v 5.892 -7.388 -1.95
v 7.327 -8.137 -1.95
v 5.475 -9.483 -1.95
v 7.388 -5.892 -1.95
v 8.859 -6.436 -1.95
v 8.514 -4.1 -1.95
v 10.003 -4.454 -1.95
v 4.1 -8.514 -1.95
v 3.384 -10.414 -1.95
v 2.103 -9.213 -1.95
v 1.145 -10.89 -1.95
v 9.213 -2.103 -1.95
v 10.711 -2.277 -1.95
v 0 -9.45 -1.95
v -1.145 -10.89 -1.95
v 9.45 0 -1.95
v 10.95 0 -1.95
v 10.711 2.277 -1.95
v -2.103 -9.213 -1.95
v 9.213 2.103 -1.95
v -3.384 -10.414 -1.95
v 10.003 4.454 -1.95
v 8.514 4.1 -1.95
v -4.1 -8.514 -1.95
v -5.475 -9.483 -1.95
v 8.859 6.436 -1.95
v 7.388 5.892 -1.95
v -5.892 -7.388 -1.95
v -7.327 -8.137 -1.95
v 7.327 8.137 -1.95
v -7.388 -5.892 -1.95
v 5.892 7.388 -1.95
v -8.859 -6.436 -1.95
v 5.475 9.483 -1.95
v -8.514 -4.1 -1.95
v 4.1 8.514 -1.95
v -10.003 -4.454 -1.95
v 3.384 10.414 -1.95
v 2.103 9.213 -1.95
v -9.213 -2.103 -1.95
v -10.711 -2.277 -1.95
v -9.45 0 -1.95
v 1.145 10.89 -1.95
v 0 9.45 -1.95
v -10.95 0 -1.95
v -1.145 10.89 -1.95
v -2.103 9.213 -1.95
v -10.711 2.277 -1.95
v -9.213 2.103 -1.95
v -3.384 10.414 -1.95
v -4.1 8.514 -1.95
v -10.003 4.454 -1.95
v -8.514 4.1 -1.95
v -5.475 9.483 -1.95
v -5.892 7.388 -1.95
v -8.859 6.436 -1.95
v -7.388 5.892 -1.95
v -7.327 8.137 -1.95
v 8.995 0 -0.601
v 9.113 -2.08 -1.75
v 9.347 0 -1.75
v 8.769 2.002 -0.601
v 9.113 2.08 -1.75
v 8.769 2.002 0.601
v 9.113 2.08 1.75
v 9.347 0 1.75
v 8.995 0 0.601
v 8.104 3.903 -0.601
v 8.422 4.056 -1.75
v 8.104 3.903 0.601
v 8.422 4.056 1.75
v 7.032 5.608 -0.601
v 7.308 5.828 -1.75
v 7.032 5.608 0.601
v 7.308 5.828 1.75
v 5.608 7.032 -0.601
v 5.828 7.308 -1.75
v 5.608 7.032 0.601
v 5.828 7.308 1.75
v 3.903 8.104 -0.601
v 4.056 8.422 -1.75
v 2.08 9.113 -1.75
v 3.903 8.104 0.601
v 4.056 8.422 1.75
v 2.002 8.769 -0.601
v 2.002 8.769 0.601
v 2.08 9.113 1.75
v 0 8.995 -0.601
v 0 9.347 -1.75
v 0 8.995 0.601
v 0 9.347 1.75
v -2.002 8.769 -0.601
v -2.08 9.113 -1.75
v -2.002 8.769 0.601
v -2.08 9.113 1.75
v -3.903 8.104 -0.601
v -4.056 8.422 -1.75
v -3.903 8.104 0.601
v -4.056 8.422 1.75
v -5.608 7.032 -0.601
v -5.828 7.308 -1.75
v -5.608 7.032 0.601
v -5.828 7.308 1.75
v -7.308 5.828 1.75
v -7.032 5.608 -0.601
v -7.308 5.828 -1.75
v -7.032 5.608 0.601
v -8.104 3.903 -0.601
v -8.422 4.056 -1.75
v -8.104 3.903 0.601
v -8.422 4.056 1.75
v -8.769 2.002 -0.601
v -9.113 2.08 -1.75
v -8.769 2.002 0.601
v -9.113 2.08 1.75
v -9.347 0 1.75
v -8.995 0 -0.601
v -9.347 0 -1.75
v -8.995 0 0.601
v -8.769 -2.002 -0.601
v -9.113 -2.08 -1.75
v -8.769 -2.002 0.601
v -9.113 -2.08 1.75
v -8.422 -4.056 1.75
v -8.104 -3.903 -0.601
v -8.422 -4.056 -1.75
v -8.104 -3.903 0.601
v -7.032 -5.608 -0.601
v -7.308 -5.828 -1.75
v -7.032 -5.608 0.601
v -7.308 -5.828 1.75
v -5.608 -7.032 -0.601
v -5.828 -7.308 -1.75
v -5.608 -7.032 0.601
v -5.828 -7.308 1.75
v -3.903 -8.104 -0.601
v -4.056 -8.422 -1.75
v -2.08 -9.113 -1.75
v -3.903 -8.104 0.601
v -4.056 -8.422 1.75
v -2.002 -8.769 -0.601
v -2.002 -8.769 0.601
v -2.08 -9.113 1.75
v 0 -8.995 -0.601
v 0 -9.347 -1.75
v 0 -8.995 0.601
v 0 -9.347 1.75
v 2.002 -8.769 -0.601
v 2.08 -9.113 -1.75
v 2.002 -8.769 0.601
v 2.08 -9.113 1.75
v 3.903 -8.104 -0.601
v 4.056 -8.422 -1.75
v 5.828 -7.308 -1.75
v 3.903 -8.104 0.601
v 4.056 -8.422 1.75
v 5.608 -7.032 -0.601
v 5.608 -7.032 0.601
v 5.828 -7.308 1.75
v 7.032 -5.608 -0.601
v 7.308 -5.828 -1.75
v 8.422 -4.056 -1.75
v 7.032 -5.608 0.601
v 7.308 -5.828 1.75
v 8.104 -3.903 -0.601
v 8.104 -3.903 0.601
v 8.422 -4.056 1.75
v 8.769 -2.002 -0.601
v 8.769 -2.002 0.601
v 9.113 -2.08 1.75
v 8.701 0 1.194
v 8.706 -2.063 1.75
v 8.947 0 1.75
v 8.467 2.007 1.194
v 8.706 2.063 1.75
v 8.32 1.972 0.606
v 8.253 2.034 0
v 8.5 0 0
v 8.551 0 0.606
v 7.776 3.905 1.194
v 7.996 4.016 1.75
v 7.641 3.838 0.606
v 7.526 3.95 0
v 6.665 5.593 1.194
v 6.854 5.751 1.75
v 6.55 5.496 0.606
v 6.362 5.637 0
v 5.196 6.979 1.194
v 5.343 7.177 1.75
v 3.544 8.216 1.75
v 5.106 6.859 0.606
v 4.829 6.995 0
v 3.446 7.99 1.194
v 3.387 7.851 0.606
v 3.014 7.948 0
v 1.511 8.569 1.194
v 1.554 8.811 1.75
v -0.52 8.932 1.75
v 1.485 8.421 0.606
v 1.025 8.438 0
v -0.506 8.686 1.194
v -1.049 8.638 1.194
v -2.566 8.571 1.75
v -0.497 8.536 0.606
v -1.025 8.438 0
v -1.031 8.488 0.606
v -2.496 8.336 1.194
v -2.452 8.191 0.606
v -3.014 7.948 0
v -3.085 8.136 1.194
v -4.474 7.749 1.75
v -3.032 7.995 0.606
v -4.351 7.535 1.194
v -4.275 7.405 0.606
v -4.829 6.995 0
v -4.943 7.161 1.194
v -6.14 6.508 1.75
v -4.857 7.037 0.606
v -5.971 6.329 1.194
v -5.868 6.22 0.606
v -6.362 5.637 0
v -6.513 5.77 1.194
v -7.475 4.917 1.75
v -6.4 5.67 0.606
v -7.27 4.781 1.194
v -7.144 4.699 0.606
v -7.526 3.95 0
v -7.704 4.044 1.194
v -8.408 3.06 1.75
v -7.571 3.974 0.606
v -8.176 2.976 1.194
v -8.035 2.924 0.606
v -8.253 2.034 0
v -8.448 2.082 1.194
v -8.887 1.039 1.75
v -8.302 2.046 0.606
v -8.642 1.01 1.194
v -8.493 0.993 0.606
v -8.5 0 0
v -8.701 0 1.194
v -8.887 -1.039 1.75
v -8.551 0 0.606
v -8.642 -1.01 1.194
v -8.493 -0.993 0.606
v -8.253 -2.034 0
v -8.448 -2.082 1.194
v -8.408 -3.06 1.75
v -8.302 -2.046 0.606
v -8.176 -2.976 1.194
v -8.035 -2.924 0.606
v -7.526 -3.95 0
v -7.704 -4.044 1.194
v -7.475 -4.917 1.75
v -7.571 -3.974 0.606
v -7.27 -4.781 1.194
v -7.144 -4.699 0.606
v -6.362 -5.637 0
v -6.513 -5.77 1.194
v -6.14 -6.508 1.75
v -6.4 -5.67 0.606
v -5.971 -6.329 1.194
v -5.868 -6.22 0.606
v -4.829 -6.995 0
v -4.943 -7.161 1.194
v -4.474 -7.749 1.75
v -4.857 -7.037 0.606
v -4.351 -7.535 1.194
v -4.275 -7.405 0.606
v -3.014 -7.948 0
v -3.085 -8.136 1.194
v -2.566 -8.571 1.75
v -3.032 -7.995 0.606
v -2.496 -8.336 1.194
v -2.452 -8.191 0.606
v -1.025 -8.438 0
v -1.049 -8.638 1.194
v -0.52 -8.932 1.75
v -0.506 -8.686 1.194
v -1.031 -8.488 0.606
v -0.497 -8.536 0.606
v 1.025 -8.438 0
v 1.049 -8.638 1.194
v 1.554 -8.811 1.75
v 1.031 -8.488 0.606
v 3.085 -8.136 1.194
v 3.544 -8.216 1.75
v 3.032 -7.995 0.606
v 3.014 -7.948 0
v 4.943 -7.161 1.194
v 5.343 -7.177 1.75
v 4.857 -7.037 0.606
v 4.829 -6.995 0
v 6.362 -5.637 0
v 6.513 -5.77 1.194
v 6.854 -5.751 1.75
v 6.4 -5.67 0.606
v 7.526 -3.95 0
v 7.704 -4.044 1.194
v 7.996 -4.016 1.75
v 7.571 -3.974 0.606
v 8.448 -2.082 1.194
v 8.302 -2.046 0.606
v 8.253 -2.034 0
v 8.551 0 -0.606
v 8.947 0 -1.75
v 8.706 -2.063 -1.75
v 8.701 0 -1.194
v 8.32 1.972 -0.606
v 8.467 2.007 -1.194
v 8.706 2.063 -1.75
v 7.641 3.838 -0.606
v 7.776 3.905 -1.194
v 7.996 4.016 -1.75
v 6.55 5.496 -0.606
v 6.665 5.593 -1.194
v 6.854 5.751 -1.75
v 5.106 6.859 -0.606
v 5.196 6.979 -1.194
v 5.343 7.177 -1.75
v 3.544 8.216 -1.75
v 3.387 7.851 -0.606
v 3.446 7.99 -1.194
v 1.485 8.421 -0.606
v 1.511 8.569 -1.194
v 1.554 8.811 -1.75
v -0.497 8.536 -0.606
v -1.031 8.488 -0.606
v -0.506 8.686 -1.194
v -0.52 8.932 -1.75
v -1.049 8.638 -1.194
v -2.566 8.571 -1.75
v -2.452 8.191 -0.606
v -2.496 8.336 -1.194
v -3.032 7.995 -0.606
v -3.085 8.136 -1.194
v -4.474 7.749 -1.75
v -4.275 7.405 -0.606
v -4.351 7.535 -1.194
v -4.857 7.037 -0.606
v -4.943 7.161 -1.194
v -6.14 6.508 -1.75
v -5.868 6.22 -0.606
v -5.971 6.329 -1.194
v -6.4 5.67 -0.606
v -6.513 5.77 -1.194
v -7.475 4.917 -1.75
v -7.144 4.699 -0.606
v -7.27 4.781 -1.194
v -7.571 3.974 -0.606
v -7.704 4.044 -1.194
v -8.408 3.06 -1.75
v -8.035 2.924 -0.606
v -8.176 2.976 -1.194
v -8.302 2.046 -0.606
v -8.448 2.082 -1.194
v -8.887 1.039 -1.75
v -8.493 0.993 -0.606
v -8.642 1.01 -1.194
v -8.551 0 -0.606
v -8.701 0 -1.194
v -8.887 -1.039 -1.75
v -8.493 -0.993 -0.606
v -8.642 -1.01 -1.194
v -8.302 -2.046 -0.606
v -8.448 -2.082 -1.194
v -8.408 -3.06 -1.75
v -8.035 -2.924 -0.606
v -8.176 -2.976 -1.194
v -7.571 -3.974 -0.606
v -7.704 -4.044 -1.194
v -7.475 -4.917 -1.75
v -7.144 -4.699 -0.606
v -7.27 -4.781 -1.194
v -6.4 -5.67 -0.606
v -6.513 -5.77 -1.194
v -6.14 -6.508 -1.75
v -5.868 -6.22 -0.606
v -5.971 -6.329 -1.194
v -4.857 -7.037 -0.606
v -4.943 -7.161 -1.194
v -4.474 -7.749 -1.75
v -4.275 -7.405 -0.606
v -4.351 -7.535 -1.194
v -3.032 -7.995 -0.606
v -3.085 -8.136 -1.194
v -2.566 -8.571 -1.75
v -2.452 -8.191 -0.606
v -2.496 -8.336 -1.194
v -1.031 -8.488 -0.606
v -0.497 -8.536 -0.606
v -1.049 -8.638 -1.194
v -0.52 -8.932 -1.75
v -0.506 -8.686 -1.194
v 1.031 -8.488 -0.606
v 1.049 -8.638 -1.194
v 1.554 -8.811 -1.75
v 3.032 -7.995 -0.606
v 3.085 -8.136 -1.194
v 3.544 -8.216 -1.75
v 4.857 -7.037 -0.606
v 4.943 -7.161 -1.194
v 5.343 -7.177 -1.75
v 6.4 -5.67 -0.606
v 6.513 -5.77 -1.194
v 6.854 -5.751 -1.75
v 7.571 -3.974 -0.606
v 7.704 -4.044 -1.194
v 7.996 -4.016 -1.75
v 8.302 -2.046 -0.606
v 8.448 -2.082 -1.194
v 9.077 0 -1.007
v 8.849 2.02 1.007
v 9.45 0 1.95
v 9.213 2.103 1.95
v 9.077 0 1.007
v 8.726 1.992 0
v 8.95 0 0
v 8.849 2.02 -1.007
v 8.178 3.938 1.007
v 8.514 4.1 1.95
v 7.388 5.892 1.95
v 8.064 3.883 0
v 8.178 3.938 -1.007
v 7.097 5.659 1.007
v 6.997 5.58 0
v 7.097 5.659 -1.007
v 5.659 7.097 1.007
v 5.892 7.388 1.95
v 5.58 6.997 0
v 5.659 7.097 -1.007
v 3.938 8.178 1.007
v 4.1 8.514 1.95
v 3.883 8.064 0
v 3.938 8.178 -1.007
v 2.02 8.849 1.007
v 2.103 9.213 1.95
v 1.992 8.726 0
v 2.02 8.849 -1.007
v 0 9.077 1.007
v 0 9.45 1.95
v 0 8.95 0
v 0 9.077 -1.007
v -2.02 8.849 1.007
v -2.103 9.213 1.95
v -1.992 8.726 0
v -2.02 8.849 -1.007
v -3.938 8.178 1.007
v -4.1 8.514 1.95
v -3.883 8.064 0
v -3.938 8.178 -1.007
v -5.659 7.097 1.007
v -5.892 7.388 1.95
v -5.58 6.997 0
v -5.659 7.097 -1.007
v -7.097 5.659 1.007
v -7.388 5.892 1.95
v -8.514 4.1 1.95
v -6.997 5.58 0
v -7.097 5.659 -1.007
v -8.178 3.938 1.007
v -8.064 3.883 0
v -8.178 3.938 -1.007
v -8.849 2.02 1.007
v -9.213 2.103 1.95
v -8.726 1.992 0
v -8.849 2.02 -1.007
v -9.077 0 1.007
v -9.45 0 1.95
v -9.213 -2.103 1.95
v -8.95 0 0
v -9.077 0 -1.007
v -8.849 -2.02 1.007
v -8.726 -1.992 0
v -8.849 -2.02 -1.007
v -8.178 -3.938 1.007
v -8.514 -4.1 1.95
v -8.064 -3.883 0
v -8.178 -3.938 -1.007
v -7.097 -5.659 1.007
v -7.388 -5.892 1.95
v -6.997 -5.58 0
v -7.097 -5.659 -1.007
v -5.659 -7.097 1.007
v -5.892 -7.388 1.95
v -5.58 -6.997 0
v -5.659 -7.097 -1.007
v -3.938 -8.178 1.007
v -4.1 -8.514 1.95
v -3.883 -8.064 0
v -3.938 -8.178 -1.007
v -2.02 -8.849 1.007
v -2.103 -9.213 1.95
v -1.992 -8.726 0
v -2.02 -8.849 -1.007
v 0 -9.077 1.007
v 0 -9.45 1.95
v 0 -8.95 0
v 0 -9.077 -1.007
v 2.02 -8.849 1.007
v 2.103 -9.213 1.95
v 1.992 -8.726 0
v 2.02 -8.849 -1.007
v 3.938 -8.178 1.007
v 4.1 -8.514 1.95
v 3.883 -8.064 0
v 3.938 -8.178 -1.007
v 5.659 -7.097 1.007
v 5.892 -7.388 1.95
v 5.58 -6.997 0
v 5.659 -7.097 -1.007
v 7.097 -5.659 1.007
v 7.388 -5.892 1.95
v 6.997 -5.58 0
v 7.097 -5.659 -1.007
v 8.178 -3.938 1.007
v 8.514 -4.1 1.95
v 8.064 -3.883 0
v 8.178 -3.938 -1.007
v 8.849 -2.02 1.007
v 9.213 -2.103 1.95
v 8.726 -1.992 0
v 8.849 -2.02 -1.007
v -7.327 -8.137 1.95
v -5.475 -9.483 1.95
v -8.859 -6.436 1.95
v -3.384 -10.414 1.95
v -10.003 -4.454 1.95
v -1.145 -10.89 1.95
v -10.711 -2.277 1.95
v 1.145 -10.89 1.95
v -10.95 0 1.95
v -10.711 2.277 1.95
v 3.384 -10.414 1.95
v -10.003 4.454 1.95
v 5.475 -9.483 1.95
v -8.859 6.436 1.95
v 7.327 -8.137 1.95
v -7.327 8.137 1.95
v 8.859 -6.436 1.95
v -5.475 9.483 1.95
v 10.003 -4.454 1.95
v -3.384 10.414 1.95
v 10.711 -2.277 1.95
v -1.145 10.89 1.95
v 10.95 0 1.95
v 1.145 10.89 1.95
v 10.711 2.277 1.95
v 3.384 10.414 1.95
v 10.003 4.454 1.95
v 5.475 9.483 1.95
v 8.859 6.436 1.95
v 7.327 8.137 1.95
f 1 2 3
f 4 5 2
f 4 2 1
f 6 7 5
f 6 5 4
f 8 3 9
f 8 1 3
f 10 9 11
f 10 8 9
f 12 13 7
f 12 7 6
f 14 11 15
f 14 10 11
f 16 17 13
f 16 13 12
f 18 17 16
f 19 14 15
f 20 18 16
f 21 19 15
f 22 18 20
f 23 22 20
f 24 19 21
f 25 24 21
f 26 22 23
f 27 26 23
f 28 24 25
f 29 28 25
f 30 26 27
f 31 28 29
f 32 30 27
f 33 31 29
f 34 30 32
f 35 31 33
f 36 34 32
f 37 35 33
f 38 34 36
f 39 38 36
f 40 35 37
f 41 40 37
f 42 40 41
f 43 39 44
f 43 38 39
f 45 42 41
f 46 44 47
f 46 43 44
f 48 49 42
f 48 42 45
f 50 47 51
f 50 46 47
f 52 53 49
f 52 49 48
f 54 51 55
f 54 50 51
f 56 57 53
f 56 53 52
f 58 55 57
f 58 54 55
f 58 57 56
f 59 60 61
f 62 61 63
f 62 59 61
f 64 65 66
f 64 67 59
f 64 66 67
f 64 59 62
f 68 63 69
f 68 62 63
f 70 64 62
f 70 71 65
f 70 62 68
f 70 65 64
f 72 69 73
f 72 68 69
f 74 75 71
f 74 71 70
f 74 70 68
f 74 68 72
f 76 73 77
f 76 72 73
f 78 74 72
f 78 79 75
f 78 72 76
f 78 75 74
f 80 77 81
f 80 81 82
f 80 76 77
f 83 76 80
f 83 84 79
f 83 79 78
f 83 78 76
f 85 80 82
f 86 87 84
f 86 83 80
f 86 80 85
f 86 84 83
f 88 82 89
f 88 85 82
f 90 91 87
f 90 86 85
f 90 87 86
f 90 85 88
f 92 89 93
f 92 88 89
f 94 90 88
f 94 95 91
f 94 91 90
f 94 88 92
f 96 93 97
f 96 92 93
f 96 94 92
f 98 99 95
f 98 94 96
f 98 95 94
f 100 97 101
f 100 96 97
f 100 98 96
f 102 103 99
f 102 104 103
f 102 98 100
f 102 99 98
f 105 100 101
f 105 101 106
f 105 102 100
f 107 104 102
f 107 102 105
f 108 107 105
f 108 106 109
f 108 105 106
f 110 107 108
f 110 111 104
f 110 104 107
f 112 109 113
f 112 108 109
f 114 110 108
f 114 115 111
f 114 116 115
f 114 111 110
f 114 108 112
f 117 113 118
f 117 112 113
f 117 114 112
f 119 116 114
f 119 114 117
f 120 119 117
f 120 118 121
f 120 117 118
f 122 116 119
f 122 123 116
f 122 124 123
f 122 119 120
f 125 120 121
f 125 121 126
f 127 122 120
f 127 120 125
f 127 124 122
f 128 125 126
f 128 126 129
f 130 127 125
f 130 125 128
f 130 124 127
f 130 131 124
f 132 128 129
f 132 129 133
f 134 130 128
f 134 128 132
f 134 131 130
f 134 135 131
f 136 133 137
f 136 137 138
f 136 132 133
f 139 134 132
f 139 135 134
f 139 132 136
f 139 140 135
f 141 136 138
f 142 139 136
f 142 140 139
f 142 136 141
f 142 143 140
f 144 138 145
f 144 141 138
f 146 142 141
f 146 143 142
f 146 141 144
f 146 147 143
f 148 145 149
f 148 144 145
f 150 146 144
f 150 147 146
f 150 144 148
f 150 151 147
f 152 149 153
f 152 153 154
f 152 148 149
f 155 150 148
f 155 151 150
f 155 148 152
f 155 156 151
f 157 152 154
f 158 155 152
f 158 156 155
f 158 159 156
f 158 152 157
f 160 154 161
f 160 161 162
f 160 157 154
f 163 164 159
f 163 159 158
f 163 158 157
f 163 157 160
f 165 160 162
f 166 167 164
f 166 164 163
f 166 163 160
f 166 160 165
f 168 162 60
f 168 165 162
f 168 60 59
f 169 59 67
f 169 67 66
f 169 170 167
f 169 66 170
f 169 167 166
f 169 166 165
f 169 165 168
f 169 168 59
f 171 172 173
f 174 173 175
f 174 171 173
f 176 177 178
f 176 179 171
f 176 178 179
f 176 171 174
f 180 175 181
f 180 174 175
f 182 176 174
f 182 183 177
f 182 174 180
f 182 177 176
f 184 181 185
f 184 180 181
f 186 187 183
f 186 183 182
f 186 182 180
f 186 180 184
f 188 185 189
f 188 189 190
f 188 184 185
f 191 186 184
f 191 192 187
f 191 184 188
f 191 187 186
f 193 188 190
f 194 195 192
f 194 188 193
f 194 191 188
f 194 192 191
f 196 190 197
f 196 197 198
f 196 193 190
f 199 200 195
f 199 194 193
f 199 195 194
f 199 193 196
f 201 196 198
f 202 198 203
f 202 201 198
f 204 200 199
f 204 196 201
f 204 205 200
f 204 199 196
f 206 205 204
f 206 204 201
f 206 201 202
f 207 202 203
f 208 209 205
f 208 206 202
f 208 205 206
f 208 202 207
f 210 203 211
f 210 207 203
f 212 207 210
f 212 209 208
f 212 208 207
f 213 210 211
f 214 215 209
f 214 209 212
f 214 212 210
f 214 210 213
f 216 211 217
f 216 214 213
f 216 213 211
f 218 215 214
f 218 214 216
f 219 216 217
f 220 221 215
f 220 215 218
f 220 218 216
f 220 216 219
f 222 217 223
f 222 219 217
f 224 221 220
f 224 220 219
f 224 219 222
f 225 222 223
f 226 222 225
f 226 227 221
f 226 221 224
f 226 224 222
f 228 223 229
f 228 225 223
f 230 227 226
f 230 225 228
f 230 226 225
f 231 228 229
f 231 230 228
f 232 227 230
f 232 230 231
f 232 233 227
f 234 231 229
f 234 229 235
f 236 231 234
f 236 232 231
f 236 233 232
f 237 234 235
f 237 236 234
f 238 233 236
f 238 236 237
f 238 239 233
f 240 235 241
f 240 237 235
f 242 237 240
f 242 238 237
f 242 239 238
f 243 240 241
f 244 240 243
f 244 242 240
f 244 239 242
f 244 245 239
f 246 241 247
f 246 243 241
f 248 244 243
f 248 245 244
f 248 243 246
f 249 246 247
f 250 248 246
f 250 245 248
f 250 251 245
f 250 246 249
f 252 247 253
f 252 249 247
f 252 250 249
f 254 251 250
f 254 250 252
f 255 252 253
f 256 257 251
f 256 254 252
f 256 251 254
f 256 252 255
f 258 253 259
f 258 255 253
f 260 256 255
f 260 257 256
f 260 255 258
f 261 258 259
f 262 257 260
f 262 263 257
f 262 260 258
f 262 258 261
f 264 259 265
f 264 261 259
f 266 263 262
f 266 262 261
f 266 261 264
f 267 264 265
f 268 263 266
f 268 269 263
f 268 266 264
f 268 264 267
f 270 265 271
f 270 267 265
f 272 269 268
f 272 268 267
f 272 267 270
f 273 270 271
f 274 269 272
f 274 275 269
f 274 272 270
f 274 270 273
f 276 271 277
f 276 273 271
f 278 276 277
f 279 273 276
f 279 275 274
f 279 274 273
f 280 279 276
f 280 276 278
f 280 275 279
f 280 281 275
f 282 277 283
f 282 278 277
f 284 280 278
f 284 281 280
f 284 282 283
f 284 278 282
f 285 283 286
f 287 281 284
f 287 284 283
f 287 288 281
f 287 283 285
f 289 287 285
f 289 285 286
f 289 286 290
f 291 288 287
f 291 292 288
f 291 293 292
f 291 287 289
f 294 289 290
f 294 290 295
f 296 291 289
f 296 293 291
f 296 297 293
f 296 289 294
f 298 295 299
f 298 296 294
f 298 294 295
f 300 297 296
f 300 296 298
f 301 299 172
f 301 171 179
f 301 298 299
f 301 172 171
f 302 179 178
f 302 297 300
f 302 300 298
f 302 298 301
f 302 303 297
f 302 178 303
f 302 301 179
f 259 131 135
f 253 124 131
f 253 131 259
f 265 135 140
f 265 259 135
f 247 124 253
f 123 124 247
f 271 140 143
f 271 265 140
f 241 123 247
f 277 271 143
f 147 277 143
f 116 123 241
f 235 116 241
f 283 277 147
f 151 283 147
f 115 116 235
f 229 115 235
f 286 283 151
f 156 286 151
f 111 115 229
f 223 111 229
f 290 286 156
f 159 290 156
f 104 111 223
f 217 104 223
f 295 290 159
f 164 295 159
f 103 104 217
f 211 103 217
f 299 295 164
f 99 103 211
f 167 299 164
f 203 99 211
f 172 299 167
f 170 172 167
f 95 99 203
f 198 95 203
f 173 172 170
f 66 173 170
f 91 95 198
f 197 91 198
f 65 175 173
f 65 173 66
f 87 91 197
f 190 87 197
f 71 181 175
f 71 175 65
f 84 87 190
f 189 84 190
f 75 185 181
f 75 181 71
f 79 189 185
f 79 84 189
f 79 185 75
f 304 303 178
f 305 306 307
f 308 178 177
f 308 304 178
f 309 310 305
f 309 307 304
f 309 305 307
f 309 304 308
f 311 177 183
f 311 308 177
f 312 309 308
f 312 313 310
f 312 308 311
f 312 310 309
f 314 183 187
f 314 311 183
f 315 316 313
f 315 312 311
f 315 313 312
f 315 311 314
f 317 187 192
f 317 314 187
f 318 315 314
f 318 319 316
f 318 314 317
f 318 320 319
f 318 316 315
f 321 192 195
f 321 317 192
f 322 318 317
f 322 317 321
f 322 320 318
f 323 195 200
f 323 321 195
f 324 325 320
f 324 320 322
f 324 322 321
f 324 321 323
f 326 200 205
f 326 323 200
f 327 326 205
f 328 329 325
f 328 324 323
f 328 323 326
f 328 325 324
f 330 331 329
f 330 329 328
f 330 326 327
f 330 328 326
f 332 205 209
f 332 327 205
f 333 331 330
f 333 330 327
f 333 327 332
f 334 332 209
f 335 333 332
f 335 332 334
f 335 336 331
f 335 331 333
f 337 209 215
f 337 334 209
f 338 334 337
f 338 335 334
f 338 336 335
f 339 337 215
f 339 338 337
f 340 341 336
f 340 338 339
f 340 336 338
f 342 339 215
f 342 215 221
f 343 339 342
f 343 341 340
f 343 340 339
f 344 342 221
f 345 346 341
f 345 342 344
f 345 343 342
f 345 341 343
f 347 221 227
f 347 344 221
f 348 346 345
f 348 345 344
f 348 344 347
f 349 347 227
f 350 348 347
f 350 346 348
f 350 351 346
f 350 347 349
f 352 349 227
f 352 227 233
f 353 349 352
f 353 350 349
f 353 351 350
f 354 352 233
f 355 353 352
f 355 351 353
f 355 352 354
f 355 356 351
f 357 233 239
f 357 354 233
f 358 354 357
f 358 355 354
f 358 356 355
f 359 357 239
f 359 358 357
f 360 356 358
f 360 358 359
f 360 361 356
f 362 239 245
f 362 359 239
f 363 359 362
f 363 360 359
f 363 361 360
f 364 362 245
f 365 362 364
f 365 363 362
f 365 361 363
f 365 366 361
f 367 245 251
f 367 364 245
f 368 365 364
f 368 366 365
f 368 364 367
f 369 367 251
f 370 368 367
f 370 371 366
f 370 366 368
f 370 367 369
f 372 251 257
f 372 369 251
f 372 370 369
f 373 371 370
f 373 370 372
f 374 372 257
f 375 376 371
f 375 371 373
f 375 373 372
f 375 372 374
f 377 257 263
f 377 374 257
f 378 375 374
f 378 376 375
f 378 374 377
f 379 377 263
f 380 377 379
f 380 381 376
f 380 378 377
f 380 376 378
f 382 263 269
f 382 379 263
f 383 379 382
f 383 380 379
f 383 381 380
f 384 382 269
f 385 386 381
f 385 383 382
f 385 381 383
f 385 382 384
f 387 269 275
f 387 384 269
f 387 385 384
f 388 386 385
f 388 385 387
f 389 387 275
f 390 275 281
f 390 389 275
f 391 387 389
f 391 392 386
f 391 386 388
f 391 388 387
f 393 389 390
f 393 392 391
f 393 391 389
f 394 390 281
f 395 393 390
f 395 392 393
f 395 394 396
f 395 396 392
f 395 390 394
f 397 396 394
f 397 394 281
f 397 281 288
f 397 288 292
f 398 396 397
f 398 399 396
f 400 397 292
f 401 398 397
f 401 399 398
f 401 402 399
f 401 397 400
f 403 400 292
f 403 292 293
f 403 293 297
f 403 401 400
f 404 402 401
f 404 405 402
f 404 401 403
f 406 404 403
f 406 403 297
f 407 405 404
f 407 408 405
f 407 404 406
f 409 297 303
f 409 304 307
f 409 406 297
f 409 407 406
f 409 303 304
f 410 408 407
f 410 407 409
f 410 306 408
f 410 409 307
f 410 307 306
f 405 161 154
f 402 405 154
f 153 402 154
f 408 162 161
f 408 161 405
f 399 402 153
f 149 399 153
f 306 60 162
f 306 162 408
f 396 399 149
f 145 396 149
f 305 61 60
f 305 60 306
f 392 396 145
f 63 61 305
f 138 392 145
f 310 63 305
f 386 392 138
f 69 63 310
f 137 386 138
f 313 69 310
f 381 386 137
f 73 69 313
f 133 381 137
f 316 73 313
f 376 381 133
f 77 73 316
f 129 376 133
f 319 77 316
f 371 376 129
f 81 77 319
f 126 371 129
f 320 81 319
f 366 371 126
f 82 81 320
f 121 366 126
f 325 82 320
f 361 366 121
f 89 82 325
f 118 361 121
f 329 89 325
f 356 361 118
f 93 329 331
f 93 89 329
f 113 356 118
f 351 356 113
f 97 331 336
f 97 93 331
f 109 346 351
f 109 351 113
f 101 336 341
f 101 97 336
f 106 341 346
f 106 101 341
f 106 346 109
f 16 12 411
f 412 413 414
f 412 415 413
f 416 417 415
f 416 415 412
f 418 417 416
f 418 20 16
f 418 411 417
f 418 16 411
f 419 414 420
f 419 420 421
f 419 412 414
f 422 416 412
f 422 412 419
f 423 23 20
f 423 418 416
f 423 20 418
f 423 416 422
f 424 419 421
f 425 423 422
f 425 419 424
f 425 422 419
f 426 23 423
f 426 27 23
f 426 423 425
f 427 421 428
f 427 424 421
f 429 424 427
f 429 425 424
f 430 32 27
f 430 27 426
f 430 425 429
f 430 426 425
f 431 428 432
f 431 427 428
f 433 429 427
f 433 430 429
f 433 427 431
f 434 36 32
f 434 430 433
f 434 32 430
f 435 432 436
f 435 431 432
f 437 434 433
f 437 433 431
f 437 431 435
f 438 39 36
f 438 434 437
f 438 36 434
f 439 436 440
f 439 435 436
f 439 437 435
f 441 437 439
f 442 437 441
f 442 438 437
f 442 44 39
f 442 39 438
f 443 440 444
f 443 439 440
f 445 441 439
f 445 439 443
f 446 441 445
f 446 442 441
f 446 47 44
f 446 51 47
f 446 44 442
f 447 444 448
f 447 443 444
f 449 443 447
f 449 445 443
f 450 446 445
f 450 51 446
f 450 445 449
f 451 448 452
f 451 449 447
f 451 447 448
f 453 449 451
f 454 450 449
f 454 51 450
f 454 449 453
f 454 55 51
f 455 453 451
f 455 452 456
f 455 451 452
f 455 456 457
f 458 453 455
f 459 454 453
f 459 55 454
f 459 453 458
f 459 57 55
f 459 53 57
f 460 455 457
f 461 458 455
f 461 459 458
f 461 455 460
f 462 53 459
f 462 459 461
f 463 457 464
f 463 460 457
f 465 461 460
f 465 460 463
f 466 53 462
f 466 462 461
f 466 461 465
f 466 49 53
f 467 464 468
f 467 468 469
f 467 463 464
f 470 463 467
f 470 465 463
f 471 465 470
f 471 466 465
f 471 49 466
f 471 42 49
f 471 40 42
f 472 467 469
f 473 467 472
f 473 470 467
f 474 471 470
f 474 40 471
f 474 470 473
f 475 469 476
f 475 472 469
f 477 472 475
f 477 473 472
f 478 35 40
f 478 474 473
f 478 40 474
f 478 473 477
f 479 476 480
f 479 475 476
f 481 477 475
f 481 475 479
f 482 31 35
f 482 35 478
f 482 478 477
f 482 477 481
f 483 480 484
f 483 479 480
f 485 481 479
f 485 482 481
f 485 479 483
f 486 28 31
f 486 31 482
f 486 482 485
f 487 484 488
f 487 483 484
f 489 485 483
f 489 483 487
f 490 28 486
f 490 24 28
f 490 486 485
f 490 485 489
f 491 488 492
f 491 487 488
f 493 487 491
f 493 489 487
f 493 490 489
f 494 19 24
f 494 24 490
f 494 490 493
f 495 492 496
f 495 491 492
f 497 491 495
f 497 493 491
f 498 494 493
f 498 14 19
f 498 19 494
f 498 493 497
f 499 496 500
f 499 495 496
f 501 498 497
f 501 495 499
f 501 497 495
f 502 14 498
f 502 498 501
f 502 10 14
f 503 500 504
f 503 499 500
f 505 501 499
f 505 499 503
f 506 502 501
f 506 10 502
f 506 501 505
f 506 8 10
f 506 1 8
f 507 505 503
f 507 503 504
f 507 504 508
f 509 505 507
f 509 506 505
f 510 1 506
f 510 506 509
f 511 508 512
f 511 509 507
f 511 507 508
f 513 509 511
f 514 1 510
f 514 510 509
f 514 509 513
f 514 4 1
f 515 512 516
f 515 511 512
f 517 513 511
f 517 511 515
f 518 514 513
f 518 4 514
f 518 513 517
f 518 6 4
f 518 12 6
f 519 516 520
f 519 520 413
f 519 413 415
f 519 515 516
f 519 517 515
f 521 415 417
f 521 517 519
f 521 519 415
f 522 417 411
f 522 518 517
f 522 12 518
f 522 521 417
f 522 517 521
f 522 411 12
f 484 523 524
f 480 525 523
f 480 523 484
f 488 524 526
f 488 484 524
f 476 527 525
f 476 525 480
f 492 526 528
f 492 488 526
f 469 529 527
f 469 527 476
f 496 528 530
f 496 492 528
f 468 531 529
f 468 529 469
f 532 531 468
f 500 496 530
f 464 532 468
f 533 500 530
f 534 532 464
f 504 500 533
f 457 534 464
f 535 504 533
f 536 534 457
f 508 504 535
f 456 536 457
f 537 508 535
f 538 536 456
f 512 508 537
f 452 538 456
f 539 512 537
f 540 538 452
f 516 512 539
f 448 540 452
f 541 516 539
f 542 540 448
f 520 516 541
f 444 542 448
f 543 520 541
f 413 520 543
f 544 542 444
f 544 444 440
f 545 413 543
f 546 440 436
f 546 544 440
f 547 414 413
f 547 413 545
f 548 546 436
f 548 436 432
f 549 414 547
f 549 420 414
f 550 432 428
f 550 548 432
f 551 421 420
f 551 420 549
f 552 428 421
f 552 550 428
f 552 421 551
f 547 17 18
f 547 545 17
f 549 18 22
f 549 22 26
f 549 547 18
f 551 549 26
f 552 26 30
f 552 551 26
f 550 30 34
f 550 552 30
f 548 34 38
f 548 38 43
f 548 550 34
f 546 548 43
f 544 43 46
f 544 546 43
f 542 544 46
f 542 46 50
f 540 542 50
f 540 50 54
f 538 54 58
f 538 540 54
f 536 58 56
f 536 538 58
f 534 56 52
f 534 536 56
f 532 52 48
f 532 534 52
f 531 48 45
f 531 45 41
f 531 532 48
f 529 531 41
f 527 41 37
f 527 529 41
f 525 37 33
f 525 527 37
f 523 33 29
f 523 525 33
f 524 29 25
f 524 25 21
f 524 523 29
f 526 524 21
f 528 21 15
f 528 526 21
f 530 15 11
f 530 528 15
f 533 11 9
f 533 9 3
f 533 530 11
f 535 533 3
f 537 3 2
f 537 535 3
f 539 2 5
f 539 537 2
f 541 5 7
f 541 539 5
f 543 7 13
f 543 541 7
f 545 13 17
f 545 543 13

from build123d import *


# Not quite as in the source:
# - a feature of the source that left no trace in its solid (it failed there, or was rolled back) is left out


with BuildPart() as f1:
    # F0 (on Front) → F1 (revolve)
    with BuildSketch(Plane.XZ):
        with BuildLine():
            Line((10.95, 1.95), (9.45, 1.95))
            ThreePointArc((9.45, 1.95), (8.95, 0), (9.45, -1.95))
            Line((9.45, -1.95), (10.95, -1.95))
            Line((10.95, -1.95), (10.95, 1.95))
        make_face()
    revolve(axis=Axis((0, 0, 0.975), (0, 0, 1)))


with BuildPart() as f4:
    # F3 (on face) → F4 (revolve)
    with BuildSketch(Plane.XZ):
        with BuildLine():
            Line((8.9473315702, -1.75), (9.3473315702, -1.75))
            ThreePointArc((9.3473315702, -1.75), (8.95, 0), (9.3473315702, 1.75))
            Line((9.3473315702, 1.75), (8.9473315702, 1.75))
            ThreePointArc((8.9473315702, 1.75), (8.6136023479, 0.9031342001), (8.5, 0))
            ThreePointArc((8.5, 0), (8.6136023479, -0.9031342001), (8.9473315702, -1.75))
        make_face()
    revolve(axis=Axis((0, 0, 0.975), (0, 0, 1)))


solid = Compound([f1.part, f4.part])
